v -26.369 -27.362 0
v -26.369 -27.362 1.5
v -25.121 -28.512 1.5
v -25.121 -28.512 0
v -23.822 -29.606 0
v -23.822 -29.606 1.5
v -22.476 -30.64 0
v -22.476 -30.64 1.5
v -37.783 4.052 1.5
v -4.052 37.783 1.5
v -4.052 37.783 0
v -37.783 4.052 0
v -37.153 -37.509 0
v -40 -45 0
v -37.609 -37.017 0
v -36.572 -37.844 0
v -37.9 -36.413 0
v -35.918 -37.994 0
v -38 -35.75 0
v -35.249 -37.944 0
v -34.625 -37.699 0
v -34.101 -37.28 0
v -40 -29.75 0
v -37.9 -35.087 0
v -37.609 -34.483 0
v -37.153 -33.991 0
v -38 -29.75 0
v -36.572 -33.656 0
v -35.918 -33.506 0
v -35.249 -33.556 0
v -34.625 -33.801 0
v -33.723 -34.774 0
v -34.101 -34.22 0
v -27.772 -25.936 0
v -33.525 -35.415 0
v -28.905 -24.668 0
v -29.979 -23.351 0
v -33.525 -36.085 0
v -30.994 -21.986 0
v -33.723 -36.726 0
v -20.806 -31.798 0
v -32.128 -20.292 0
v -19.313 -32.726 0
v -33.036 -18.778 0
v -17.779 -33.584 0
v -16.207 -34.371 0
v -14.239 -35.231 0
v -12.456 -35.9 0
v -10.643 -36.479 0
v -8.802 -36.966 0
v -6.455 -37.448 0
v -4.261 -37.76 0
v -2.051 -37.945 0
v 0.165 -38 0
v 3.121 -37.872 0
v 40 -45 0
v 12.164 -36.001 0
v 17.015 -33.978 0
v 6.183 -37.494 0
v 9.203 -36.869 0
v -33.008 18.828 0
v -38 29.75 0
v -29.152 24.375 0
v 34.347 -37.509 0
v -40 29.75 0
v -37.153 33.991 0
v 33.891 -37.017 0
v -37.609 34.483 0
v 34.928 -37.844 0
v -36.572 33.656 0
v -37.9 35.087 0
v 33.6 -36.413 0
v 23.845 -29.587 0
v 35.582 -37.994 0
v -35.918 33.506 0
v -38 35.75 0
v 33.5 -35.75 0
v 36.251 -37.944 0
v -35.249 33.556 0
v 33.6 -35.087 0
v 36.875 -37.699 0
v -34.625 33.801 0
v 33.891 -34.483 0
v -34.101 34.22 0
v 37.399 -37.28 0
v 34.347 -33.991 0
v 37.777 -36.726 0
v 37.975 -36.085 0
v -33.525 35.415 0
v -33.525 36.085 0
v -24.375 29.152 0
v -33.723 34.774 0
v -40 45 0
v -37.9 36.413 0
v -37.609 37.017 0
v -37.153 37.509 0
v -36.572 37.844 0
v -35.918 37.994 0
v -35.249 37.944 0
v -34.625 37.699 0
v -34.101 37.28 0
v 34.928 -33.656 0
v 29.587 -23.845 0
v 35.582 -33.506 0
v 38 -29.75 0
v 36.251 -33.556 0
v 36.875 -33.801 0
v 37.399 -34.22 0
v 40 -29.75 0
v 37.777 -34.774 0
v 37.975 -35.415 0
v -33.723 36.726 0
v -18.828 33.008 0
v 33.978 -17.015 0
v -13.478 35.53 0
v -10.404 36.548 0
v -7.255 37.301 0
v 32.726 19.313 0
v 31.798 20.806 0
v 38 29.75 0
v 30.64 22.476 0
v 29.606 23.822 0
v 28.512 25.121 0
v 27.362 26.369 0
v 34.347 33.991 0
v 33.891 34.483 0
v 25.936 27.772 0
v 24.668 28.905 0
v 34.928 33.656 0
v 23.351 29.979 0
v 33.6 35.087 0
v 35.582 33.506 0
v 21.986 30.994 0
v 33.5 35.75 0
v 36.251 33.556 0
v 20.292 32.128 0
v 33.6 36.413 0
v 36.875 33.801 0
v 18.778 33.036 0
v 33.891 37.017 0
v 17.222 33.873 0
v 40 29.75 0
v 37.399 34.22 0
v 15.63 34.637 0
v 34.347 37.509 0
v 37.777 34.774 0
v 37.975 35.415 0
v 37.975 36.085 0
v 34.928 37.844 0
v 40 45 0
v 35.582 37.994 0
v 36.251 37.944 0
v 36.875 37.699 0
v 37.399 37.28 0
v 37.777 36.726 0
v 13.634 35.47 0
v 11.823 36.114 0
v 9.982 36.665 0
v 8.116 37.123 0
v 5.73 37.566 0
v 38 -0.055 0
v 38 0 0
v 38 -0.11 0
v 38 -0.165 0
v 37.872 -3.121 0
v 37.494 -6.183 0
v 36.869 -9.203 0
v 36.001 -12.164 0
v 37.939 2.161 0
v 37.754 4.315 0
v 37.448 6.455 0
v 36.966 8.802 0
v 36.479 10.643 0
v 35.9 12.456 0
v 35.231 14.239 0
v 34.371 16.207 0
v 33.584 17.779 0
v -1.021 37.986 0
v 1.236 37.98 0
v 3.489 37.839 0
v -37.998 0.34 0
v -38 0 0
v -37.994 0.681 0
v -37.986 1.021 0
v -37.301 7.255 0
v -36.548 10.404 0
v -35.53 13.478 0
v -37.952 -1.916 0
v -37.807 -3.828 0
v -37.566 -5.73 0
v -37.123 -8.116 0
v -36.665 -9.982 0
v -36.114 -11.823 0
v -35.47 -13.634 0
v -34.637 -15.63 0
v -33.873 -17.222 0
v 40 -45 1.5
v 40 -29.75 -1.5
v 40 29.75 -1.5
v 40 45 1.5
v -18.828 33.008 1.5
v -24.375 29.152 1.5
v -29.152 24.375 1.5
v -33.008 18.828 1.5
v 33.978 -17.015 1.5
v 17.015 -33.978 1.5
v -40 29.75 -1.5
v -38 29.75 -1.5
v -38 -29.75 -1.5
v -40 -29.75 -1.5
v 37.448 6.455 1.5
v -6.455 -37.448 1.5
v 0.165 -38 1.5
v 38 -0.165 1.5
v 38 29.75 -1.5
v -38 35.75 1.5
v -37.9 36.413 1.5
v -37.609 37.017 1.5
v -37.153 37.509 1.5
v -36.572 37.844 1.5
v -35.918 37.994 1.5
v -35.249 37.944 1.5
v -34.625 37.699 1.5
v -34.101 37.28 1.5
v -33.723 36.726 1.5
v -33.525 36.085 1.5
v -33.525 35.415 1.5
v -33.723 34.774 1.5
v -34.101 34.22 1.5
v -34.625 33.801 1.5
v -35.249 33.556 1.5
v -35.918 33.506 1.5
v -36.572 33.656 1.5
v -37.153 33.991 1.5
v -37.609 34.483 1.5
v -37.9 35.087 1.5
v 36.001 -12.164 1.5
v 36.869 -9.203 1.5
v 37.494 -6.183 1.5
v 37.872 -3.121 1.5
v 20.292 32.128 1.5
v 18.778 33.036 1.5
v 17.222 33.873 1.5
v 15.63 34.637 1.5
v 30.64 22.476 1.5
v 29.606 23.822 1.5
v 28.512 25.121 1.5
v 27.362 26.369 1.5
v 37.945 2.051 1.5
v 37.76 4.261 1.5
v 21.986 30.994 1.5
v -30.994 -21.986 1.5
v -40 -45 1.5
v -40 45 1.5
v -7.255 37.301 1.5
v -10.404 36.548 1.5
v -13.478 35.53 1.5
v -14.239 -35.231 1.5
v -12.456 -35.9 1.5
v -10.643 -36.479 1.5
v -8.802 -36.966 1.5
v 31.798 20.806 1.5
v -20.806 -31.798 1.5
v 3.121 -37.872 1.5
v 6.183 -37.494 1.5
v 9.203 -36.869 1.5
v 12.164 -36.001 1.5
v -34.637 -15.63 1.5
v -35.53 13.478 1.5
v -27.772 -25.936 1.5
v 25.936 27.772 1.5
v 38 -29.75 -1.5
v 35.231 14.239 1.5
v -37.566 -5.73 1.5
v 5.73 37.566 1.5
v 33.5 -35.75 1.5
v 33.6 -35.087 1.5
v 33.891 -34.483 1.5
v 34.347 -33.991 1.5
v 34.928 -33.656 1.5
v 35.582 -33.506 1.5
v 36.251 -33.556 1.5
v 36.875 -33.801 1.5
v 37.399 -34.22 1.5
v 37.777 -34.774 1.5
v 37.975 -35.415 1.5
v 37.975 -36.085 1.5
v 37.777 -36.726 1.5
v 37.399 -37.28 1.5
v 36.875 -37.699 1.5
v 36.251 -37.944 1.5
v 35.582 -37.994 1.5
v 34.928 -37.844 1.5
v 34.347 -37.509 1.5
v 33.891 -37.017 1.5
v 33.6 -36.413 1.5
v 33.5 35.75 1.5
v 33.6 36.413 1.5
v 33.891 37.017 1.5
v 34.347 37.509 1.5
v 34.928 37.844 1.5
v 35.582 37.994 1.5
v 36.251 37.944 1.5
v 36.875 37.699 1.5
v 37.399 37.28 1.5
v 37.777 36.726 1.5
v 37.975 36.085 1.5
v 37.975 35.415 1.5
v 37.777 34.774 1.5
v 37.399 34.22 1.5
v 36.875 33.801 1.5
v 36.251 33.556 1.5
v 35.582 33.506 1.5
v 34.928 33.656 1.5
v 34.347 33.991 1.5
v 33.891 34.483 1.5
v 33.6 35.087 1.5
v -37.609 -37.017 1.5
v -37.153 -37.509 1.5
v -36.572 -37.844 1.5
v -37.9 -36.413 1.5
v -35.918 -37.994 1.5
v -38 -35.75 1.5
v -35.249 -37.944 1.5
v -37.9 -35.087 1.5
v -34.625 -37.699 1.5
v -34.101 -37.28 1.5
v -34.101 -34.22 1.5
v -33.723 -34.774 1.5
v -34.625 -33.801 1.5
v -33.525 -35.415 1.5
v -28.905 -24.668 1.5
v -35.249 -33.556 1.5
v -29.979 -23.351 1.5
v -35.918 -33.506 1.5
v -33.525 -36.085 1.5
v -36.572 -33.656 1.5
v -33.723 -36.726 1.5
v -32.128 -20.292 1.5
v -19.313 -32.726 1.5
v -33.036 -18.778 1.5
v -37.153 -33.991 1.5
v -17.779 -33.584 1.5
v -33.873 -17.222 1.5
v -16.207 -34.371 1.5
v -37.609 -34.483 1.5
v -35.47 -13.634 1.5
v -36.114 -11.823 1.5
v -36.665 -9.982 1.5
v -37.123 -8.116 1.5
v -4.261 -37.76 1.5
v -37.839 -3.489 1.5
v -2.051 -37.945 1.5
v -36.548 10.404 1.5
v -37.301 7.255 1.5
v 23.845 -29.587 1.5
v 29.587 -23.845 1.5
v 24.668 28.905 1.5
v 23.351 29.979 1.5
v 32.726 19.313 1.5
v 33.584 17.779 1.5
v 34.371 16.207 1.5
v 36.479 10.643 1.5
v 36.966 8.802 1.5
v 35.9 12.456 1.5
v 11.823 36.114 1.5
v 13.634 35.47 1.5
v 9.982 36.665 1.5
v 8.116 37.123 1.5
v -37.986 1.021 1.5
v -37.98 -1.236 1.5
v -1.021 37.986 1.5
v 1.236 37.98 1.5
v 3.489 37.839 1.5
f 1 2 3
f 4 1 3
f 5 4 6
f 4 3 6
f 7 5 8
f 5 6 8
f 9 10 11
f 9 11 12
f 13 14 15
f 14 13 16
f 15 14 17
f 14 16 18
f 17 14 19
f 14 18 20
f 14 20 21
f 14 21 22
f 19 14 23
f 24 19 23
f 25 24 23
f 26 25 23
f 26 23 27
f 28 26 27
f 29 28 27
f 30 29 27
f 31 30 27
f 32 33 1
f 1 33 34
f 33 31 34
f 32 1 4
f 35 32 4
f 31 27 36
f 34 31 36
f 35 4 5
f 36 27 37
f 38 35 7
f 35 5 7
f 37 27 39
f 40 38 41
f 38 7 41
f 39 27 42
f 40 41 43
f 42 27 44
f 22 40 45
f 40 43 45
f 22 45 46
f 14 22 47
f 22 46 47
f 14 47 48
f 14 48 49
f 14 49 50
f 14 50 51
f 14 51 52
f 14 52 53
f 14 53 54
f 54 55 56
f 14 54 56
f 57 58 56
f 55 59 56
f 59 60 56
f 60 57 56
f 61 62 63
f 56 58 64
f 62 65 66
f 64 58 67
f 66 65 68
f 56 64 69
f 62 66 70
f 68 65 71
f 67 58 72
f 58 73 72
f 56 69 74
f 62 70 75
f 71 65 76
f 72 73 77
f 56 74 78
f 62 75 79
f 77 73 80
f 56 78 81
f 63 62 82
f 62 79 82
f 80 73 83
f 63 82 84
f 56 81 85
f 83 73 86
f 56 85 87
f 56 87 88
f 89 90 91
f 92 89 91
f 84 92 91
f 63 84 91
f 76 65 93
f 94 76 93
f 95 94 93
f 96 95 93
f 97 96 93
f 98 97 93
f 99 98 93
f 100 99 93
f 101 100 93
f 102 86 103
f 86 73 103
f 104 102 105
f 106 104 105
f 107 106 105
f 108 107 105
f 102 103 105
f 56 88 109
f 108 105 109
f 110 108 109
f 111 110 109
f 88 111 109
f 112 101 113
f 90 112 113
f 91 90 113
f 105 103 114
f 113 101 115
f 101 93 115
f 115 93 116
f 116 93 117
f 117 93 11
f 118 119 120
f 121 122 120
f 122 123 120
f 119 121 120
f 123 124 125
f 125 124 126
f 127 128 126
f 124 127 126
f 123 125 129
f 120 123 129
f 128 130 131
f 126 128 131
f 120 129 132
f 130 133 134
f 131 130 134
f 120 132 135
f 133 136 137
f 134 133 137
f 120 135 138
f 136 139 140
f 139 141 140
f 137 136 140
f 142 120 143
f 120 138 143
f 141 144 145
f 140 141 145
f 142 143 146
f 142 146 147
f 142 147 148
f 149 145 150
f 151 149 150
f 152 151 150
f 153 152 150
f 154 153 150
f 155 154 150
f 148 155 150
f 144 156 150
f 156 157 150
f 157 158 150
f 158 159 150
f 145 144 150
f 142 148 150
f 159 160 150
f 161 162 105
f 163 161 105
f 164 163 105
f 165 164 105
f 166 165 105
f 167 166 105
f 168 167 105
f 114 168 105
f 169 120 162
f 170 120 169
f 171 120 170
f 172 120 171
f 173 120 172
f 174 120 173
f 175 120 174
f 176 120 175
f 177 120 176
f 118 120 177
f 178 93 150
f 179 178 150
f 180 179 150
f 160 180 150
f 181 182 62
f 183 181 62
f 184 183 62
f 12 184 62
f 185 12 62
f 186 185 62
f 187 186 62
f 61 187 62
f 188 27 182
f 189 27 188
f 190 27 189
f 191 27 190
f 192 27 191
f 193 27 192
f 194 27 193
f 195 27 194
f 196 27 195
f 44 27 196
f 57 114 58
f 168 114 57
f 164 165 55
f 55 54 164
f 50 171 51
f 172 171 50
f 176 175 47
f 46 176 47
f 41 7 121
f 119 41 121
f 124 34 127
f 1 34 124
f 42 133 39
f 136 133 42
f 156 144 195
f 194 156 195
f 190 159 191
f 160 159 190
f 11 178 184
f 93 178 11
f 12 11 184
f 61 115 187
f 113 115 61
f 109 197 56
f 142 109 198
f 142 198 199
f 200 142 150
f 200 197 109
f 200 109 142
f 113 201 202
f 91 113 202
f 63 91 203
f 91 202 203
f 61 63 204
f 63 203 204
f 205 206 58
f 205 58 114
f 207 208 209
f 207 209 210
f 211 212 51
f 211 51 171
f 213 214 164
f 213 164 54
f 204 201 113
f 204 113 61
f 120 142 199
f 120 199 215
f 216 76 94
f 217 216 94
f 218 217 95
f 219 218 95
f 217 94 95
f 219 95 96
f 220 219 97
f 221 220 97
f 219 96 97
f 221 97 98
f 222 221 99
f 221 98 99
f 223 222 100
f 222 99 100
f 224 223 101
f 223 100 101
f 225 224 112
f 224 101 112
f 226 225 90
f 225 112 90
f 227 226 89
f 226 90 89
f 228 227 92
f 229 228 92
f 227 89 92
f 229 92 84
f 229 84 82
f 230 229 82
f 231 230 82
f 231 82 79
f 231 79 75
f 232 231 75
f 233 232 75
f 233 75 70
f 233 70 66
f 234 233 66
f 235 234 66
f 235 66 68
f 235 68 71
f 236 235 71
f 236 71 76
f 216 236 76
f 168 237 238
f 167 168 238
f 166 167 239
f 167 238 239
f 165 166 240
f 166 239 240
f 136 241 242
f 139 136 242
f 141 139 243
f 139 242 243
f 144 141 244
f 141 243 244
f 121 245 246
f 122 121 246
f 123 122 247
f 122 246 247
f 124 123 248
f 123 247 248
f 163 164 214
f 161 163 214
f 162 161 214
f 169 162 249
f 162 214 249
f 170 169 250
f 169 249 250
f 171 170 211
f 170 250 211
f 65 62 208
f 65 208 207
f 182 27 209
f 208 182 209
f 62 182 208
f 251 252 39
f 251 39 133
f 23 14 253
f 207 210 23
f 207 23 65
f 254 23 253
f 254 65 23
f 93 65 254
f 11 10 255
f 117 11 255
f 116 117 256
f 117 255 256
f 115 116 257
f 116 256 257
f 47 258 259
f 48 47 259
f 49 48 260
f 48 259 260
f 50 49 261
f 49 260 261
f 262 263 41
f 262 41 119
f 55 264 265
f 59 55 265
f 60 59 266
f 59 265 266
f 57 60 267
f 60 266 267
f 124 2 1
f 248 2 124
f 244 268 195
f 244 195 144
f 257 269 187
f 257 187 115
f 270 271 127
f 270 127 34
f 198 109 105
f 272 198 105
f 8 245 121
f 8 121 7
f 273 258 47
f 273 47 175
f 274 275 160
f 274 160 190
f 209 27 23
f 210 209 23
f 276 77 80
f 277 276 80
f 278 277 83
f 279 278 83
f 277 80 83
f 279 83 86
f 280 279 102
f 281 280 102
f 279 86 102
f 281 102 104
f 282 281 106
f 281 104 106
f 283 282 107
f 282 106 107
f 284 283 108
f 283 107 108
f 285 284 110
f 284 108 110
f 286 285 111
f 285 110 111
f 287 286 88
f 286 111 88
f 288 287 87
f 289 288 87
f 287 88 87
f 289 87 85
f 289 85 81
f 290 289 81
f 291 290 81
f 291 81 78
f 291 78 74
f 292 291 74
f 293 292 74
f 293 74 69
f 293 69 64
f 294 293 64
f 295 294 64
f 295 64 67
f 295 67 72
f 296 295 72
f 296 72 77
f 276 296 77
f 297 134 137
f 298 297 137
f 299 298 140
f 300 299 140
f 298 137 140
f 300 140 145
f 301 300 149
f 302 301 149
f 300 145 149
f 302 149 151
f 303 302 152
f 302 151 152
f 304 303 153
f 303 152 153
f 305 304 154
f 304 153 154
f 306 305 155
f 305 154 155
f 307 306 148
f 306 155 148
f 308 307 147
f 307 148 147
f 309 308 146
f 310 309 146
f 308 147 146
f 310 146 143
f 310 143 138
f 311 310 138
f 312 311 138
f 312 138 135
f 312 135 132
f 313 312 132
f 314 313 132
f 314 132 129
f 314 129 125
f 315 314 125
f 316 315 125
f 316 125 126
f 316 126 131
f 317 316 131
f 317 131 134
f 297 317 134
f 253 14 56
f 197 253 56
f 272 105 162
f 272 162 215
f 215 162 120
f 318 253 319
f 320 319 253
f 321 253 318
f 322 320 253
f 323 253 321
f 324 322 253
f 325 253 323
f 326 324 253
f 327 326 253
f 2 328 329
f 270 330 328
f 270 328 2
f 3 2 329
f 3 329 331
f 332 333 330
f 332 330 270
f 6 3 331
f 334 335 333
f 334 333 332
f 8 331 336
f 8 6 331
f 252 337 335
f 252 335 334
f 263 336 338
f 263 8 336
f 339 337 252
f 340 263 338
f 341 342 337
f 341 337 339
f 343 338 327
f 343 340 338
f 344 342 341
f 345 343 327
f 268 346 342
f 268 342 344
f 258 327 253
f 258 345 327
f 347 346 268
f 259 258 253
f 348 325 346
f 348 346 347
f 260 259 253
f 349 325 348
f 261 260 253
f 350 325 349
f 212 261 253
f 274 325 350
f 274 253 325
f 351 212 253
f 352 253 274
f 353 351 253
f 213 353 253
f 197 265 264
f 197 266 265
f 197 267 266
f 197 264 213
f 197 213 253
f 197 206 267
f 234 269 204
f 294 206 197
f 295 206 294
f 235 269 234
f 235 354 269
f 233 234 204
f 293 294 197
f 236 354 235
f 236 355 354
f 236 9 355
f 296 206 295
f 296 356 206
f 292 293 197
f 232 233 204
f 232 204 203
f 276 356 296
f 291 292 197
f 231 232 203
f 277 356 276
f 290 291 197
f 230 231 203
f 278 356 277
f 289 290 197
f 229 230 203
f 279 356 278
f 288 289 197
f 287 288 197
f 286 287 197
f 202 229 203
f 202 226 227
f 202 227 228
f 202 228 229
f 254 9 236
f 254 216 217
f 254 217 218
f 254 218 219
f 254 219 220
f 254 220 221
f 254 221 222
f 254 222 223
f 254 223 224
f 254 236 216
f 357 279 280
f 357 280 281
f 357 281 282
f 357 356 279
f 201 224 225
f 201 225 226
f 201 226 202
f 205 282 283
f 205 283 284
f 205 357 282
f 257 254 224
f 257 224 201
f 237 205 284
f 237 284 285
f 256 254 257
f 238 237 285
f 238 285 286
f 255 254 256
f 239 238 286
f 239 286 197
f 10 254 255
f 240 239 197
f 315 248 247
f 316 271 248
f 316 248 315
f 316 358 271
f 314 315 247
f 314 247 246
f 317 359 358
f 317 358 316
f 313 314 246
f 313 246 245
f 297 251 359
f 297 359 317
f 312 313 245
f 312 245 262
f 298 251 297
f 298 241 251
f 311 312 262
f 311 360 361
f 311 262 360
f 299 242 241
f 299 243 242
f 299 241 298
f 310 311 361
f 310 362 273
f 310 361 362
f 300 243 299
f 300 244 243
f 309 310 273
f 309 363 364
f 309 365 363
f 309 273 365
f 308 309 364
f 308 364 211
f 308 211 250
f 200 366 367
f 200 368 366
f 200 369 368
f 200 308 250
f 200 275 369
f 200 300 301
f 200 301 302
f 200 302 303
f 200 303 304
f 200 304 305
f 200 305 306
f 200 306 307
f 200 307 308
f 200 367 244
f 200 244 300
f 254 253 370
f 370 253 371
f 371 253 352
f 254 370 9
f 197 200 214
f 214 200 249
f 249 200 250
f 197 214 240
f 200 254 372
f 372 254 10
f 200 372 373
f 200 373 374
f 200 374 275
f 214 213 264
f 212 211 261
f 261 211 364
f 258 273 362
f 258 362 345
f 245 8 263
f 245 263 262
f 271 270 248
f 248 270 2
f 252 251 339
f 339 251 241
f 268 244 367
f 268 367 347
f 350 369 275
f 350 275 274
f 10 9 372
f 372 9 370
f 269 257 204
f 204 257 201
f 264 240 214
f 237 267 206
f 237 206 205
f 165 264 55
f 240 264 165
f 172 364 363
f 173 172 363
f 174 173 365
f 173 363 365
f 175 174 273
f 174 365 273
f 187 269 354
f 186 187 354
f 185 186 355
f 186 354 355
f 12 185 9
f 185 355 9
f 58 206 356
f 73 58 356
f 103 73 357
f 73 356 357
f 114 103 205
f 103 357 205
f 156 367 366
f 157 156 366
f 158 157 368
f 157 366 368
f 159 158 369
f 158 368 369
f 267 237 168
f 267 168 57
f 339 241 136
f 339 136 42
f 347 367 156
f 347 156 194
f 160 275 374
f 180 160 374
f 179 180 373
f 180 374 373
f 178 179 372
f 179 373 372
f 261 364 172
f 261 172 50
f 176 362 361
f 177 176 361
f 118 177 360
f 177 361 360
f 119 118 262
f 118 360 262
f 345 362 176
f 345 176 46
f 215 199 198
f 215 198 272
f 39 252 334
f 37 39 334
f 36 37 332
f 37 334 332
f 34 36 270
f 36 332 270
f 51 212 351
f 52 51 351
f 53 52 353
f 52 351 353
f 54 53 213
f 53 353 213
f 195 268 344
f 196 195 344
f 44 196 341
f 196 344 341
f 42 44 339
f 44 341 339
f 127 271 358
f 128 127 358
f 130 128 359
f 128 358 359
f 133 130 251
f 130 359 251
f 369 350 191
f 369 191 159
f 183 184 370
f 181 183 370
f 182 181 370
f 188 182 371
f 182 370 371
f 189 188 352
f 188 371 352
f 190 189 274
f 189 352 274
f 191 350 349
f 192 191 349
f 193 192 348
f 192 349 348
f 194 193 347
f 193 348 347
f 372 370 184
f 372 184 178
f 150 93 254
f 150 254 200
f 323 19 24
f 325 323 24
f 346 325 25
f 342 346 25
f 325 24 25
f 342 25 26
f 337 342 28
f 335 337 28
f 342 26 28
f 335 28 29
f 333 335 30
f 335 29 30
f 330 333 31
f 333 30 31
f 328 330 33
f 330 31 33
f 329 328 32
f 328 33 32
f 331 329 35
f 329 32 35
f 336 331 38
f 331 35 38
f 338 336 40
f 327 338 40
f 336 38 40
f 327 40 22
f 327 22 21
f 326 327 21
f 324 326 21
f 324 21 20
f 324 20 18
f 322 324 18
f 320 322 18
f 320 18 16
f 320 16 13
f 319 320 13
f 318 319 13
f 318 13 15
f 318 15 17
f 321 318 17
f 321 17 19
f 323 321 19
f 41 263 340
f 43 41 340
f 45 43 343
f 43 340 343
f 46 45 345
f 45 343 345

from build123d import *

# Parameters (mm, degrees)
SKETCH5_W            = 80
SKETCH5_H            = 90
BOSS_EXTRUDE2_DEPTH  = 1.5
M4_CLEARANCE_HOLE2_D = 4.5
SKETCH8_R            = 38
CUT_EXTRUDE1_DEPTH   = 2
BOSS_EXTRUDE3_DEPTH  = 1.5
SKETCH10_W           = 2
SKETCH10_H           = 59.5
BOSS_EXTRUDE4_DEPTH  = 1.5


with BuildPart() as part:
    # Sketch5 → Boss-Extrude2 (new body)
    with BuildSketch(Plane.XY):
        Rectangle(SKETCH5_W, SKETCH5_H)
    extrude(amount=BOSS_EXTRUDE2_DEPTH)

    # M4 Clearance Hole2 (through all)
    with Locations(Plane.XY.offset(1.5)):
        with Locations((35.75, 35.75), (-35.75, -35.75), (-35.75, 35.75), (35.75, -35.75)):
            Hole(M4_CLEARANCE_HOLE2_D / 2)

    # Sketch8 → Cut-Extrude1 (cut)
    with BuildSketch(Plane.XY.offset(1.5)):
        Circle(SKETCH8_R)
    extrude(amount=-CUT_EXTRUDE1_DEPTH, mode=Mode.SUBTRACT)

    # Sketch9 → Boss-Extrude3 (add)
    with BuildSketch(Plane.XY.offset(1.5)):
        with BuildLine():
            Line((-18.828232369, 33.007539531), (-33.007539531, 18.828232369))
            ThreePointArc((-33.007539531, 18.828232369), (-34.372809901, 16.202158483), (-35.52955283, 13.477791945))
            Line((-35.52955283, 13.477791945), (-13.477791945, 35.52955283))
            ThreePointArc((-13.477791945, 35.52955283), (-16.202158483, 34.372809901), (-18.828232369, 33.007539531))
        make_face()
        with BuildLine():
            Line((-4.052476159, 37.78329574), (-37.78329574, 4.052476159))
            ThreePointArc((-37.78329574, 4.052476159), (-37.915095853, 2.538800193), (-37.986279438, 1.021065336))
            Line((-37.986279438, 1.021065336), (-1.021065336, 37.986279438))
            ThreePointArc((-1.021065336, 37.986279438), (-2.538800193, 37.915095853), (-4.052476159, 37.78329574))
        make_face()
        with BuildLine():
            Line((5.729767662, 37.565539561), (-37.565539561, -5.729767662))
            ThreePointArc((-37.565539561, -5.729767662), (-37.363427276, -6.926348402), (-37.123210121, -8.115865346))
            Line((-37.123210121, -8.115865346), (8.115865346, 37.123210121))
            ThreePointArc((8.115865346, 37.123210121), (6.926348402, 37.363427276), (5.729767662, 37.565539561))
        make_face()
        with BuildLine():
            Line((13.634094956, 35.469866855), (-35.469866855, -13.634094956))
            ThreePointArc((-35.469866855, -13.634094956), (-35.067590884, -14.637761769), (-34.636921504, -15.629576729))
            Line((-34.636921504, -15.629576729), (15.629576729, 34.636921504))
            ThreePointArc((15.629576729, 34.636921504), (14.637761769, 35.067590884), (13.634094956, 35.469866855))
        make_face()
        with BuildLine():
            Line((20.292391155, 32.128163054), (-32.128163054, -20.292391155))
            ThreePointArc((-32.128163054, -20.292391155), (-31.572249627, -21.146939577), (-30.993612648, -21.986267874))
            Line((-30.993612648, -21.986267874), (21.986267874, 30.993612648))
            ThreePointArc((21.986267874, 30.993612648), (21.146939577, 31.572249627), (20.292391155, 32.128163054))
        make_face()
        with BuildLine():
            Line((25.936489585, 27.772261485), (-27.772261485, -25.936489585))
            ThreePointArc((-27.772261485, -25.936489585), (-27.080082578, -26.658378187), (-26.369145748, -27.361800973))
            Line((-26.369145748, -27.361800973), (27.361800973, 26.369145748))
            ThreePointArc((27.361800973, 26.369145748), (26.658378187, 27.080082578), (25.936489585, 27.772261485))
        make_face()
        with BuildLine():
            Line((30.64028313, 22.47605503), (-22.47605503, -30.64028313))
            ThreePointArc((-22.47605503, -30.64028313), (-21.648561438, -31.230430475), (-20.805580736, -31.798235961))
            Line((-20.805580736, -31.798235961), (31.798235961, 20.805580736))
            ThreePointArc((31.798235961, 20.805580736), (31.230430475, 21.648561438), (30.64028313, 22.47605503))
        make_face()
        with BuildLine():
            Line((34.370751902, 16.206523801), (-16.206523801, -34.370751902))
            ThreePointArc((-16.206523801, -34.370751902), (-15.228749713, -34.815013747), (-14.238811494, -35.23146672))
            Line((-14.238811494, -35.23146672), (35.23146672, 14.238811494))
            ThreePointArc((35.23146672, 14.238811494), (34.815013747, 15.228749713), (34.370751902, 16.206523801))
        make_face()
        with BuildLine():
            Line((36.966476918, 8.802248818), (-8.802248818, -36.966476918))
            ThreePointArc((-8.802248818, -36.966476918), (-7.632453052, -37.225604903), (-6.455069393, -37.447724619))
            Line((-6.455069393, -37.447724619), (37.447724619, 6.455069393))
            ThreePointArc((37.447724619, 6.455069393), (37.225604903, 7.632453052), (36.966476918, 8.802248818))
        make_face()
        with BuildLine():
            Line((37.999643576, -0.164584524), (0.164584524, -37.999643576))
            ThreePointArc((0.164584524, -37.999643576), (1.644059958, -37.964418432), (3.121041877, -37.871613348))
            Line((3.121041877, -37.871613348), (37.871613348, -3.121041877))
            ThreePointArc((37.871613348, -3.121041877), (37.964418432, -1.644059958), (37.999643576, -0.164584524))
        make_face()
        with BuildLine():
            Line((36.000661901, -12.1635662), (12.1635662, -36.000661901))
            ThreePointArc((12.1635662, -36.000661901), (14.624168706, -35.073261748), (17.014742957, -33.977912268))
            Line((17.014742957, -33.977912268), (33.977912268, -17.014742957))
            ThreePointArc((33.977912268, -17.014742957), (35.073261748, -14.624168706), (36.000661901, -12.1635662))
        make_face()
    extrude(amount=-BOSS_EXTRUDE3_DEPTH)

    # Sketch10 → Boss-Extrude4 (add)
    with BuildSketch(Plane(origin=(0, 0, 0), x_dir=(-1, 0, 0), z_dir=(0, 0, -1))):
        with Locations((-39, 0)):
            Rectangle(SKETCH10_W, SKETCH10_H)
        with Locations((39, 0)):
            Rectangle(SKETCH10_W, SKETCH10_H)
    extrude(amount=BOSS_EXTRUDE4_DEPTH)


solid = part.part
